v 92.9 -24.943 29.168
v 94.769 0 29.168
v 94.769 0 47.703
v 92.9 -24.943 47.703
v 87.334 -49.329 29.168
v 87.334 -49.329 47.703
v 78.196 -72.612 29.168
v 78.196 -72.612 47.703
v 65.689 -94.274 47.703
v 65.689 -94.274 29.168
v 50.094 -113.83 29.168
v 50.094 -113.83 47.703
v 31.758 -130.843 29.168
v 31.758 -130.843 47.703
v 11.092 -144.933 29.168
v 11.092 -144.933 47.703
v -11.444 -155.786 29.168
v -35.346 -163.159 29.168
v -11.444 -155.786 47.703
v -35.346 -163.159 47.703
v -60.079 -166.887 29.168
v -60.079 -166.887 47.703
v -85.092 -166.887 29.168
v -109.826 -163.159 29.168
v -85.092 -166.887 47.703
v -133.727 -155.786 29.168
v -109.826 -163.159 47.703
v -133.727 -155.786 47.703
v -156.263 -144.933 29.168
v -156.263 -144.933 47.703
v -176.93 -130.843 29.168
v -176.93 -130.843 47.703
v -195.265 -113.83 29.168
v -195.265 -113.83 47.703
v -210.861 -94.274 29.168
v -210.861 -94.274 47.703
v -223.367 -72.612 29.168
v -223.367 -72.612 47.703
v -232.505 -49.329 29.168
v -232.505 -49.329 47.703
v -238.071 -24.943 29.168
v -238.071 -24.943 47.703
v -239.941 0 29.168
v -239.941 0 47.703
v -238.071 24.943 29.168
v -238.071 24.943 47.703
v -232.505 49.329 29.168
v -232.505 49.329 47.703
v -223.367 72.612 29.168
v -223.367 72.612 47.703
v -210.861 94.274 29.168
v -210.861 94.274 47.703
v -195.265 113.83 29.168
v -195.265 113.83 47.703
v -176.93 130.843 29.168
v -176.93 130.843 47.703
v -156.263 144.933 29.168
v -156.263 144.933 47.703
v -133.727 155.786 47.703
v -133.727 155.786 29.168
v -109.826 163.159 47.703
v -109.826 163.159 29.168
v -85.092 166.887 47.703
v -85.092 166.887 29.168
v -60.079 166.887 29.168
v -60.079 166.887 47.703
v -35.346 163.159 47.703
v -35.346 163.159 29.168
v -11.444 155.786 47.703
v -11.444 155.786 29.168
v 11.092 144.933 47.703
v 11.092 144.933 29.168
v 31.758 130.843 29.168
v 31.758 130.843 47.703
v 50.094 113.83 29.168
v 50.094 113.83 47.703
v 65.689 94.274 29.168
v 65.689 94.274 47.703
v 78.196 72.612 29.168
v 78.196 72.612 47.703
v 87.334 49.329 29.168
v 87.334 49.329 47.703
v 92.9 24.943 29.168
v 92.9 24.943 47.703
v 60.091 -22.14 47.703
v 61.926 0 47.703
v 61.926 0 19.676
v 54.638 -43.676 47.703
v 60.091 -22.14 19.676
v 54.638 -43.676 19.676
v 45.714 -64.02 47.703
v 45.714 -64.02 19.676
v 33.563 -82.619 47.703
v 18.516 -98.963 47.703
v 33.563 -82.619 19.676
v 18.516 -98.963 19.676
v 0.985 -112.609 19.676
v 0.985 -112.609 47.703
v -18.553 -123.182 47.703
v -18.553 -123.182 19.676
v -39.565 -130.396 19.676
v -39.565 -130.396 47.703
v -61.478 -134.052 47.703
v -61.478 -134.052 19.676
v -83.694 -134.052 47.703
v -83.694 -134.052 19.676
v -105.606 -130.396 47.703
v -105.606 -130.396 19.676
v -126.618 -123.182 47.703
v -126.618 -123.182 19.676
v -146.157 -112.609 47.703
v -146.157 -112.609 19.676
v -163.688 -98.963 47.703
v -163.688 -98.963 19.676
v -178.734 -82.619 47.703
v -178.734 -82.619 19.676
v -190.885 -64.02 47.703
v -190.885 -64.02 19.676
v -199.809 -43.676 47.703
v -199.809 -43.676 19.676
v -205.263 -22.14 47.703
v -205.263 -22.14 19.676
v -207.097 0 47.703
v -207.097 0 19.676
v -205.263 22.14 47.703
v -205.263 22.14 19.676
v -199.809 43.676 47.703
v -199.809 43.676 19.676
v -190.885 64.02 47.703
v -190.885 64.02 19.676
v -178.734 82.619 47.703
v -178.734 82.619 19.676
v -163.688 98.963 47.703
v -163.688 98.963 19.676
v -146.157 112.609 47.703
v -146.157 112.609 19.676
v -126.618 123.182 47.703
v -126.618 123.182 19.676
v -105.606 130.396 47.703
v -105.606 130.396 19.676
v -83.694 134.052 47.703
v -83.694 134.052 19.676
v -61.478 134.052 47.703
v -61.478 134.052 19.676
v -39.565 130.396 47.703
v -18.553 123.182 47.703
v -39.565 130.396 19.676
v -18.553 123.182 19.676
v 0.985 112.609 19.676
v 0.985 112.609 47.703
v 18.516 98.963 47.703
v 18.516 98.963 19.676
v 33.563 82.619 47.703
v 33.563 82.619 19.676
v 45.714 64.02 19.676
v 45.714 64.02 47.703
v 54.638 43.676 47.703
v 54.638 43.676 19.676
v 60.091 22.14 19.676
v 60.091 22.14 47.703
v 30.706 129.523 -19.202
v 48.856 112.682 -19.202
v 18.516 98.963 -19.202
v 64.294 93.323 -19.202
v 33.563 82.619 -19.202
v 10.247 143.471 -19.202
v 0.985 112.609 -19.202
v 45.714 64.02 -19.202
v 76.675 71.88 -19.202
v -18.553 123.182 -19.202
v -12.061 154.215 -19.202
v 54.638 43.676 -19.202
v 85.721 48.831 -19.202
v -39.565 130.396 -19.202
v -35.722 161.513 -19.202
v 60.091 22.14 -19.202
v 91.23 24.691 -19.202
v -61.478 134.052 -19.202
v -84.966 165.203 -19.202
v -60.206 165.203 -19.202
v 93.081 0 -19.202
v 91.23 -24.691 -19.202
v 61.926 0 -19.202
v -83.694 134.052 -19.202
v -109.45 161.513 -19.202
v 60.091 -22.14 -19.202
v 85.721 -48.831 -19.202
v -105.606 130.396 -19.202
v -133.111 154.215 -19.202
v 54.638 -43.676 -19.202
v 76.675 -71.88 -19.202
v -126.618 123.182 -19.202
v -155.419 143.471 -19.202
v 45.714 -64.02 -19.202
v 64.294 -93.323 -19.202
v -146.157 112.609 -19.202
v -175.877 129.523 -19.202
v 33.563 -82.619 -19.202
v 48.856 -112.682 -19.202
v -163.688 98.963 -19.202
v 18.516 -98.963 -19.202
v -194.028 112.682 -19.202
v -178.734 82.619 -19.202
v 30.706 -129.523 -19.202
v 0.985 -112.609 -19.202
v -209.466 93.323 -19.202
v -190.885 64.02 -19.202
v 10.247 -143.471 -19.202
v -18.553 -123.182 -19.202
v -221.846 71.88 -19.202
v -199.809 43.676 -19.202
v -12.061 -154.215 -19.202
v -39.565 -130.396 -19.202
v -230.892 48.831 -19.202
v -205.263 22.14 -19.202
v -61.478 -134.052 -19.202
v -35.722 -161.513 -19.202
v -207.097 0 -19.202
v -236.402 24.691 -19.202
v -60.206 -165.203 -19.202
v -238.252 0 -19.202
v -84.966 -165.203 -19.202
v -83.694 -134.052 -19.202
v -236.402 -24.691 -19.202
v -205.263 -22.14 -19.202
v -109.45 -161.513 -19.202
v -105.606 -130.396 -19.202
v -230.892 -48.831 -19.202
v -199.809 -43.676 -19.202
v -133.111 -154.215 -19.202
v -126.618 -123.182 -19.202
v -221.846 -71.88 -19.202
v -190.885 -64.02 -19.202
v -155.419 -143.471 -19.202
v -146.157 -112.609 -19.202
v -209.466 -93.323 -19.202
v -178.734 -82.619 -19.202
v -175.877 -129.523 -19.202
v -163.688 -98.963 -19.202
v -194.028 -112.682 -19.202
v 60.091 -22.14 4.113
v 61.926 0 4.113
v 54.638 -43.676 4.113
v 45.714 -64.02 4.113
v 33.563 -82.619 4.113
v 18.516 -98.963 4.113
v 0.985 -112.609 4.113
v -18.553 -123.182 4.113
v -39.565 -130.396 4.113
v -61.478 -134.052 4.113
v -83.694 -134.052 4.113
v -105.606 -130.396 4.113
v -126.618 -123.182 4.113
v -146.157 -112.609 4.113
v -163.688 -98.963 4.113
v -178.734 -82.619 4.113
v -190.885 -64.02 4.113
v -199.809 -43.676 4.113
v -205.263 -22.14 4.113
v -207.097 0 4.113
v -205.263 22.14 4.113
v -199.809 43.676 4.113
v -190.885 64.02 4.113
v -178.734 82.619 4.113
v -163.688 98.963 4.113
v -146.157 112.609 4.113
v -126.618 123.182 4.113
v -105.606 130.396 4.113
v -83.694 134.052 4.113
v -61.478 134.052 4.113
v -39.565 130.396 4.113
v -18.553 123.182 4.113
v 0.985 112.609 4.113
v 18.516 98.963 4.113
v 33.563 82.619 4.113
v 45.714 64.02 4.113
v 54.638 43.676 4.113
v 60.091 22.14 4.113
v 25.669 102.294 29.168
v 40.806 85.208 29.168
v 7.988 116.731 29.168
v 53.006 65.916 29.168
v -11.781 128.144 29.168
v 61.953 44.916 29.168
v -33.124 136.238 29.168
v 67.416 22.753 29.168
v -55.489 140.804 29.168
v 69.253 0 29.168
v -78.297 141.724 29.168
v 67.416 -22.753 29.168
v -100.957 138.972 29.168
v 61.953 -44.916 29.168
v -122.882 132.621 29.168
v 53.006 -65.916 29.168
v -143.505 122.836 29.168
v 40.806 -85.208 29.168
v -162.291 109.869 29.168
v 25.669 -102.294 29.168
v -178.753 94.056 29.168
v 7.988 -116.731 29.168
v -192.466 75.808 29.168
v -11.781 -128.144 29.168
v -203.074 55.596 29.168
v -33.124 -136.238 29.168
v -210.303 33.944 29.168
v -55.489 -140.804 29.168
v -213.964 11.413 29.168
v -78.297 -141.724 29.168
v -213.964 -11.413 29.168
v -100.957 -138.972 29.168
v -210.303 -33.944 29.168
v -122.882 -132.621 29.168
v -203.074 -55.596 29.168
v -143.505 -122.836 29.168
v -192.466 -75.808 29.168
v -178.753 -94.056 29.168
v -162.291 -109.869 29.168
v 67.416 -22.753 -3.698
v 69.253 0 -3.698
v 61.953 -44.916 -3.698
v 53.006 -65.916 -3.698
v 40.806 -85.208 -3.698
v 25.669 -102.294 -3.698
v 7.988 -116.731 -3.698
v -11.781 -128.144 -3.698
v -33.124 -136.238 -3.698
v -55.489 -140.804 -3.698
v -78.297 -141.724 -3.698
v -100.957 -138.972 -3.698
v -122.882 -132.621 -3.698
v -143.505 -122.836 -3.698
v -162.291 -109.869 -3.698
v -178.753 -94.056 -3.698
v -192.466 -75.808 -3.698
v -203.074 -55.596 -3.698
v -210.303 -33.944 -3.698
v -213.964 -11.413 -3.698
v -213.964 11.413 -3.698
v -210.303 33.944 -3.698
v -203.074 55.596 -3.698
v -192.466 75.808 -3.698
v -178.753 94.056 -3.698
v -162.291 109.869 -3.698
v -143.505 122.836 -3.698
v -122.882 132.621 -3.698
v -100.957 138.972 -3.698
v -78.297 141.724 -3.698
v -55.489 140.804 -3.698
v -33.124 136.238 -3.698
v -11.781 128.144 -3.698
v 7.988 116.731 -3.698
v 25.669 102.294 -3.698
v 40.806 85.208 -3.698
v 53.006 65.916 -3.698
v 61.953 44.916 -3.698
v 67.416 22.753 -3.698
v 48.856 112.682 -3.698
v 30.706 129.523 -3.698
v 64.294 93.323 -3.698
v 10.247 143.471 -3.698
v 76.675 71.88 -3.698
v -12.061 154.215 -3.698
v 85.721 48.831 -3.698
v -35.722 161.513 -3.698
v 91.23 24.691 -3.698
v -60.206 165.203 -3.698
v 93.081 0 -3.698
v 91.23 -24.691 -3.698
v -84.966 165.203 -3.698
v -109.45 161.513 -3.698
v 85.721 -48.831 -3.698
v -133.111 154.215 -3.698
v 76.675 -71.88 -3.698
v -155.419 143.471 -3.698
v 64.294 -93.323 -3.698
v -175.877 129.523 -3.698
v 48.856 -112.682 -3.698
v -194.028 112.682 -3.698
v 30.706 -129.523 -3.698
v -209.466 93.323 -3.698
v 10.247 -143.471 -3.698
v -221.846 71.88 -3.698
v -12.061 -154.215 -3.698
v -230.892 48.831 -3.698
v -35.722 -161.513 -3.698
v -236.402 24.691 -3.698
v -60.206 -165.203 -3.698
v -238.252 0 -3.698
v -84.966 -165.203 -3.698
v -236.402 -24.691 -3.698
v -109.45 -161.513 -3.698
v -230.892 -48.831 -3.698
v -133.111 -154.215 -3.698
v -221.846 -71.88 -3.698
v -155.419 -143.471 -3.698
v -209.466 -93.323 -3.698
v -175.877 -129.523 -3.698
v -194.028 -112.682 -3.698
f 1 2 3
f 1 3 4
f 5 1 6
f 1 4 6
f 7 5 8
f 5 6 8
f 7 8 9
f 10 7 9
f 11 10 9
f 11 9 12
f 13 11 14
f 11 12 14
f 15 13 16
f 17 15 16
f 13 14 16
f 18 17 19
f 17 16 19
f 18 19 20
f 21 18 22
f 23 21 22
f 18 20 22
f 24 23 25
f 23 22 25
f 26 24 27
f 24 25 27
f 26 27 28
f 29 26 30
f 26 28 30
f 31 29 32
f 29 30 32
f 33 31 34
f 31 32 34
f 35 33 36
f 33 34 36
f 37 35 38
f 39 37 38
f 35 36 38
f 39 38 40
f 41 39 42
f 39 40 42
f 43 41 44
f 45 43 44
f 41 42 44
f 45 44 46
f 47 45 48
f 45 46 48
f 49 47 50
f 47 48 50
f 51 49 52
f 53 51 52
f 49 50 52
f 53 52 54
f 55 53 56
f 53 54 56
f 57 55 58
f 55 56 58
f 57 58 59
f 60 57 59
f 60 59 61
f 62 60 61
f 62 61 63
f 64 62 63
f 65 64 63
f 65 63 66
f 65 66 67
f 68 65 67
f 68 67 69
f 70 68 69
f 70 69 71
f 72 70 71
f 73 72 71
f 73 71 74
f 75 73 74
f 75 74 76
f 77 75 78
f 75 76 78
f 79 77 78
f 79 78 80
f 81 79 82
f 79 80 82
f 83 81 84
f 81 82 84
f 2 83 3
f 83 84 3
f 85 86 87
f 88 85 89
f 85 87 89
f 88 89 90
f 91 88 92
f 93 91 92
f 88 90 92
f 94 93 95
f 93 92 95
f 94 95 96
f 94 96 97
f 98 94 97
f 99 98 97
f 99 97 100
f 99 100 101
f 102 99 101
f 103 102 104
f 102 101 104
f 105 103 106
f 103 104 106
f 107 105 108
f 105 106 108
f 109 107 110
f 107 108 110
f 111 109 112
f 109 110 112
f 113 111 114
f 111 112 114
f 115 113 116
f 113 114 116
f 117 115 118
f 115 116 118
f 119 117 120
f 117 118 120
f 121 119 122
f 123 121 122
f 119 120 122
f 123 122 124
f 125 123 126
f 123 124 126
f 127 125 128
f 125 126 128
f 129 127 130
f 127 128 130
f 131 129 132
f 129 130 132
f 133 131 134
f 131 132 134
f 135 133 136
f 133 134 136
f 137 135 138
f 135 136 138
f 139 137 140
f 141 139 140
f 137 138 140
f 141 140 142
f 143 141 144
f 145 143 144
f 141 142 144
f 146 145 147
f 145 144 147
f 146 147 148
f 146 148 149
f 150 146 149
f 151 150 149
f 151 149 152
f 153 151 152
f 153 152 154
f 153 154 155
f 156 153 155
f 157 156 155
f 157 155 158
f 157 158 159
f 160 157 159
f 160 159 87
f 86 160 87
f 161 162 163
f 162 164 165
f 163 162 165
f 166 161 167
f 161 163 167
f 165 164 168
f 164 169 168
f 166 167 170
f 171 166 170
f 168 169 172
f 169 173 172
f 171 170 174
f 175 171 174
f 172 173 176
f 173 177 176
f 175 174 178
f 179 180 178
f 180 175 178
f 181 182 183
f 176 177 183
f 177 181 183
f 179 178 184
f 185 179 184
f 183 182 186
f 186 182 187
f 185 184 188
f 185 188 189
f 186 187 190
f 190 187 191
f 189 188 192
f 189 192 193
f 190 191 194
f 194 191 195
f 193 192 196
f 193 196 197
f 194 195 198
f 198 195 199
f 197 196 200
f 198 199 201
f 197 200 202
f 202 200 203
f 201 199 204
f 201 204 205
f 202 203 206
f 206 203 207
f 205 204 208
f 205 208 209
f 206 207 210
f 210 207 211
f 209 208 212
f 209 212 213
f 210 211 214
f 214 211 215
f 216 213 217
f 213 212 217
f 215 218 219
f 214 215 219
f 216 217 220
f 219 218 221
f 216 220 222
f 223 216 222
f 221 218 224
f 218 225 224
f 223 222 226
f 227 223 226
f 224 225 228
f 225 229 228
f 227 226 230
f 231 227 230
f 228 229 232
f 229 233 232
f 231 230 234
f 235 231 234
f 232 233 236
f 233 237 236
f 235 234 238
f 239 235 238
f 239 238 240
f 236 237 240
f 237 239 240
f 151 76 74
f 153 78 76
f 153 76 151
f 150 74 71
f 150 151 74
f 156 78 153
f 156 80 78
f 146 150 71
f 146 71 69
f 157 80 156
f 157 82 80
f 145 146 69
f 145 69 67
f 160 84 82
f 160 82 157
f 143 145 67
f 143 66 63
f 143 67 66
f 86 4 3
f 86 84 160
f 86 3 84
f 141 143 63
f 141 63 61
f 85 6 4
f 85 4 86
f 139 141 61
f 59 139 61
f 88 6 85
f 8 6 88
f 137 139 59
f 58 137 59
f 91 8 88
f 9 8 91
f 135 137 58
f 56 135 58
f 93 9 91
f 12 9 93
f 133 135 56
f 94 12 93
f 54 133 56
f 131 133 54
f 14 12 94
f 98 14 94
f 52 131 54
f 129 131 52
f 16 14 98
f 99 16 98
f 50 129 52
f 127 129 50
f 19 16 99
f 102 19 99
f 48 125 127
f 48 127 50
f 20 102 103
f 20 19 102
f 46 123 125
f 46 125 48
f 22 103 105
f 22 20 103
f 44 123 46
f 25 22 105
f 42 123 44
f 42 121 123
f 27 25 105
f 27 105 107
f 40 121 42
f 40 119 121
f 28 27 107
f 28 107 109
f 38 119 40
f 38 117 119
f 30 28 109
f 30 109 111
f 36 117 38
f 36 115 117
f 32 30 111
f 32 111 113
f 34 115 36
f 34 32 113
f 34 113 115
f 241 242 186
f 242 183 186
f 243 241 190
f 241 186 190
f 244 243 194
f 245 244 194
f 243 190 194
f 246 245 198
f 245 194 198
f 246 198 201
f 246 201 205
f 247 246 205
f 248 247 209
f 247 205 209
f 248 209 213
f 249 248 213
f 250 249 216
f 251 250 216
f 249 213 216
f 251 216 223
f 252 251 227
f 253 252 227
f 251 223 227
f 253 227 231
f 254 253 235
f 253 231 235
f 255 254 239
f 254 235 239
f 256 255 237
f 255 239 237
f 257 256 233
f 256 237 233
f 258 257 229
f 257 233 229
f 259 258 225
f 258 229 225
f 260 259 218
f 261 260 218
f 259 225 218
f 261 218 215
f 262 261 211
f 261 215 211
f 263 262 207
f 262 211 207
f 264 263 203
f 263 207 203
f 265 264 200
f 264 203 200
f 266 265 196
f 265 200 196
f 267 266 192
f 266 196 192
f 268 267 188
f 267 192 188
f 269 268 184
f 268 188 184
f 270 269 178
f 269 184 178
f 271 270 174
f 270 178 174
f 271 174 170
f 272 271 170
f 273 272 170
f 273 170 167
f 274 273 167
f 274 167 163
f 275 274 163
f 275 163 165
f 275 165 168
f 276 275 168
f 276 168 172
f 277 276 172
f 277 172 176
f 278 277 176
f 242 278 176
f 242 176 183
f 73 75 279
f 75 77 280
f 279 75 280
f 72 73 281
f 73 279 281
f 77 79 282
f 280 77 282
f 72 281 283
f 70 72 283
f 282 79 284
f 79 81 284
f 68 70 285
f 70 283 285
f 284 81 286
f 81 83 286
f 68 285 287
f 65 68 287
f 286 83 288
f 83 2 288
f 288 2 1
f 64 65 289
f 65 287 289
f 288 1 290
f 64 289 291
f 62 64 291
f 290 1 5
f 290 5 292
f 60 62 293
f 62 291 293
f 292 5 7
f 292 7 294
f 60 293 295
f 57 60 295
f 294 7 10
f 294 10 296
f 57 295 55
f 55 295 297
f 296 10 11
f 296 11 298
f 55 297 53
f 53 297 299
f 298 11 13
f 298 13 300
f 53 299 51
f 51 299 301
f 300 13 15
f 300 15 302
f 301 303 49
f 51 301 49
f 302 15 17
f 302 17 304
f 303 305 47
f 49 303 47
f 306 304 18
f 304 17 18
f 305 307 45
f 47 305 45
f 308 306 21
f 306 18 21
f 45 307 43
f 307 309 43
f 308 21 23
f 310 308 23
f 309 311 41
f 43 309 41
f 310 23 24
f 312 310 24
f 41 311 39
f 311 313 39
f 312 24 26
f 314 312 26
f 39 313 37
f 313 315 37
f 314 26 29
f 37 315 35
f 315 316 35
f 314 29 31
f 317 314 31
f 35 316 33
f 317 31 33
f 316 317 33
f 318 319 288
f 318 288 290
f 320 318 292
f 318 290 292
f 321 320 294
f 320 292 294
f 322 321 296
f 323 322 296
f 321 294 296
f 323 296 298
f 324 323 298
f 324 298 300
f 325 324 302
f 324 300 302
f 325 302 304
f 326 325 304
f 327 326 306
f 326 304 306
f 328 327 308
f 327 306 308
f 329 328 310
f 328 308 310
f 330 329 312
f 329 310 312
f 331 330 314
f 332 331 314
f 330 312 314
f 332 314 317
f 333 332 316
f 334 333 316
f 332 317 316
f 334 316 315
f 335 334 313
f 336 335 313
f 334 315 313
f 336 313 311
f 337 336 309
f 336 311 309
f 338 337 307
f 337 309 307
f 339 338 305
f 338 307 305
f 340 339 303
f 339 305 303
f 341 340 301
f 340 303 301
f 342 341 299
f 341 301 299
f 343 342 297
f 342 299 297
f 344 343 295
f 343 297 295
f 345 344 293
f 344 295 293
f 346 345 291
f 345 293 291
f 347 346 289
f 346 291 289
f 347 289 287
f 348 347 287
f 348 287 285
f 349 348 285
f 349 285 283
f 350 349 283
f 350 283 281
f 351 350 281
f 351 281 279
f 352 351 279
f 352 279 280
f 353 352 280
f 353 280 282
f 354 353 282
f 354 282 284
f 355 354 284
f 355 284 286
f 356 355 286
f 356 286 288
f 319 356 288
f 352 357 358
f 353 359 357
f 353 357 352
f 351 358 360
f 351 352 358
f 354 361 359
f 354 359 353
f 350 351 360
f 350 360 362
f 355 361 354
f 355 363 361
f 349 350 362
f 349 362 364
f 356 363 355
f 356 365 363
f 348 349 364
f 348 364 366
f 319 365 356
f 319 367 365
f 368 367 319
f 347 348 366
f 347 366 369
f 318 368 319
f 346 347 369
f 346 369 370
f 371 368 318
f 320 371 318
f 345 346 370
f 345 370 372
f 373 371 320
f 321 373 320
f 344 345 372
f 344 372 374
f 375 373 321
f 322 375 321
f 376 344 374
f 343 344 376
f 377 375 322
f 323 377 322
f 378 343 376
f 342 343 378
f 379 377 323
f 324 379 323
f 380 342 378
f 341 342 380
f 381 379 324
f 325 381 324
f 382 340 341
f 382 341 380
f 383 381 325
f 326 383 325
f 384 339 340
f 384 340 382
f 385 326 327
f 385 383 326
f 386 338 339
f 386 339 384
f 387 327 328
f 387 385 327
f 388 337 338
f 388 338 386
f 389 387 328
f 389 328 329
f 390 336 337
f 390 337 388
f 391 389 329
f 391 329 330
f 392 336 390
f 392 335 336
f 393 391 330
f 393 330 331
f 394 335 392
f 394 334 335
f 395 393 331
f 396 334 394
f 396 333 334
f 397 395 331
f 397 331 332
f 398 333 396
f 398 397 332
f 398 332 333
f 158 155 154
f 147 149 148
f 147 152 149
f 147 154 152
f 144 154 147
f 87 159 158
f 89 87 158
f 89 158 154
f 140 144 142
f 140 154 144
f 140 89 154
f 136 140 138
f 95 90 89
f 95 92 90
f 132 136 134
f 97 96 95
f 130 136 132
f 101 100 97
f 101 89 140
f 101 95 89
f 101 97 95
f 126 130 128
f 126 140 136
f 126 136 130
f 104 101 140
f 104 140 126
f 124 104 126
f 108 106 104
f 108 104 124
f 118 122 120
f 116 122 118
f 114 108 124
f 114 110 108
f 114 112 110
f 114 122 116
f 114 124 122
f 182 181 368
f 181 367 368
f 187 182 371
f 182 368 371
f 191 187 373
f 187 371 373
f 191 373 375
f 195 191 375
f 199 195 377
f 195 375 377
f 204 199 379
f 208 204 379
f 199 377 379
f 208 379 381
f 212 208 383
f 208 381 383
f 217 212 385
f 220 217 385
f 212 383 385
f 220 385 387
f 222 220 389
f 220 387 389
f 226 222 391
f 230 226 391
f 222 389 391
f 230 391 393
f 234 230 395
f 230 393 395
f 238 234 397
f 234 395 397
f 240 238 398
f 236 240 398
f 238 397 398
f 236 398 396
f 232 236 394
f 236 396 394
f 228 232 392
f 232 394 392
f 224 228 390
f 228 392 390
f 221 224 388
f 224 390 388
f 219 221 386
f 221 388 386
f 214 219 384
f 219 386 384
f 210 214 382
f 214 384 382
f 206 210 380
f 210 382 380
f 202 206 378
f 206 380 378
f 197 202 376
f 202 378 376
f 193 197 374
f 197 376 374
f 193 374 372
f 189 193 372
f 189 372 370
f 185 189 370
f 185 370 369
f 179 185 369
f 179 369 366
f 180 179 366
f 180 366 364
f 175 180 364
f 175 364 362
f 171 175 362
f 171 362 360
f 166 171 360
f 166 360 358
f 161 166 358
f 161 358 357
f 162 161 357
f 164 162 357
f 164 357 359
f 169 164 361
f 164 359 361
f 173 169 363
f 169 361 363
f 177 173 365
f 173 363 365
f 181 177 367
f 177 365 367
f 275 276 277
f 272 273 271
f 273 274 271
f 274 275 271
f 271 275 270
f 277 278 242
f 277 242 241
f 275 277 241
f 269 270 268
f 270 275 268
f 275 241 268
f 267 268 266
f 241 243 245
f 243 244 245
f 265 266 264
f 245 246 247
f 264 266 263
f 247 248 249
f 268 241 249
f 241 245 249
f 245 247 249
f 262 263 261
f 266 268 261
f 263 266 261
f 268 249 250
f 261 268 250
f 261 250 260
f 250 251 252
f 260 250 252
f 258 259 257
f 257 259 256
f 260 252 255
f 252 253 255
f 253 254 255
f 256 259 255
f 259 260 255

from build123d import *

# Parameters (mm, degrees)
F0_W   = 134.5115825534
F0_H   = 15.5633129179
F0_W_2 = 25.5161747336
F0_H_2 = 18.5351353139
F0_W_3 = 23.8279551268
F0_H_3 = 15.50362329


with BuildPart() as f1:
    # F0 (on Front) → F1 (revolve)
    with BuildSketch(Plane.XZ):
        with Locations((-5.3299926221, 11.8945706636)):
            Rectangle(F0_W, F0_H)
        Polygon((69.2527592182, 29.1677135974), (69.2527592182, 47.7028489113), (61.9257986546, 47.7028489113), (61.9257986546, 19.6762271225), (61.9257986546, 4.1129142046), (61.9257986546, -19.2015636712), (69.2527592182, -19.2015636712), (69.2527592182, -3.6979403812), align=None)
        with Locations((82.010846585, 38.4352812544)):
            Rectangle(F0_W_2, F0_H_2)
        with Locations((81.1667367816, -11.4497520262)):
            Rectangle(F0_W_3, F0_H_3)
    revolve(axis=Axis((-72.5857838988, 0, 11.8945706636), (0, 0, -1)))


solid = f1.part
